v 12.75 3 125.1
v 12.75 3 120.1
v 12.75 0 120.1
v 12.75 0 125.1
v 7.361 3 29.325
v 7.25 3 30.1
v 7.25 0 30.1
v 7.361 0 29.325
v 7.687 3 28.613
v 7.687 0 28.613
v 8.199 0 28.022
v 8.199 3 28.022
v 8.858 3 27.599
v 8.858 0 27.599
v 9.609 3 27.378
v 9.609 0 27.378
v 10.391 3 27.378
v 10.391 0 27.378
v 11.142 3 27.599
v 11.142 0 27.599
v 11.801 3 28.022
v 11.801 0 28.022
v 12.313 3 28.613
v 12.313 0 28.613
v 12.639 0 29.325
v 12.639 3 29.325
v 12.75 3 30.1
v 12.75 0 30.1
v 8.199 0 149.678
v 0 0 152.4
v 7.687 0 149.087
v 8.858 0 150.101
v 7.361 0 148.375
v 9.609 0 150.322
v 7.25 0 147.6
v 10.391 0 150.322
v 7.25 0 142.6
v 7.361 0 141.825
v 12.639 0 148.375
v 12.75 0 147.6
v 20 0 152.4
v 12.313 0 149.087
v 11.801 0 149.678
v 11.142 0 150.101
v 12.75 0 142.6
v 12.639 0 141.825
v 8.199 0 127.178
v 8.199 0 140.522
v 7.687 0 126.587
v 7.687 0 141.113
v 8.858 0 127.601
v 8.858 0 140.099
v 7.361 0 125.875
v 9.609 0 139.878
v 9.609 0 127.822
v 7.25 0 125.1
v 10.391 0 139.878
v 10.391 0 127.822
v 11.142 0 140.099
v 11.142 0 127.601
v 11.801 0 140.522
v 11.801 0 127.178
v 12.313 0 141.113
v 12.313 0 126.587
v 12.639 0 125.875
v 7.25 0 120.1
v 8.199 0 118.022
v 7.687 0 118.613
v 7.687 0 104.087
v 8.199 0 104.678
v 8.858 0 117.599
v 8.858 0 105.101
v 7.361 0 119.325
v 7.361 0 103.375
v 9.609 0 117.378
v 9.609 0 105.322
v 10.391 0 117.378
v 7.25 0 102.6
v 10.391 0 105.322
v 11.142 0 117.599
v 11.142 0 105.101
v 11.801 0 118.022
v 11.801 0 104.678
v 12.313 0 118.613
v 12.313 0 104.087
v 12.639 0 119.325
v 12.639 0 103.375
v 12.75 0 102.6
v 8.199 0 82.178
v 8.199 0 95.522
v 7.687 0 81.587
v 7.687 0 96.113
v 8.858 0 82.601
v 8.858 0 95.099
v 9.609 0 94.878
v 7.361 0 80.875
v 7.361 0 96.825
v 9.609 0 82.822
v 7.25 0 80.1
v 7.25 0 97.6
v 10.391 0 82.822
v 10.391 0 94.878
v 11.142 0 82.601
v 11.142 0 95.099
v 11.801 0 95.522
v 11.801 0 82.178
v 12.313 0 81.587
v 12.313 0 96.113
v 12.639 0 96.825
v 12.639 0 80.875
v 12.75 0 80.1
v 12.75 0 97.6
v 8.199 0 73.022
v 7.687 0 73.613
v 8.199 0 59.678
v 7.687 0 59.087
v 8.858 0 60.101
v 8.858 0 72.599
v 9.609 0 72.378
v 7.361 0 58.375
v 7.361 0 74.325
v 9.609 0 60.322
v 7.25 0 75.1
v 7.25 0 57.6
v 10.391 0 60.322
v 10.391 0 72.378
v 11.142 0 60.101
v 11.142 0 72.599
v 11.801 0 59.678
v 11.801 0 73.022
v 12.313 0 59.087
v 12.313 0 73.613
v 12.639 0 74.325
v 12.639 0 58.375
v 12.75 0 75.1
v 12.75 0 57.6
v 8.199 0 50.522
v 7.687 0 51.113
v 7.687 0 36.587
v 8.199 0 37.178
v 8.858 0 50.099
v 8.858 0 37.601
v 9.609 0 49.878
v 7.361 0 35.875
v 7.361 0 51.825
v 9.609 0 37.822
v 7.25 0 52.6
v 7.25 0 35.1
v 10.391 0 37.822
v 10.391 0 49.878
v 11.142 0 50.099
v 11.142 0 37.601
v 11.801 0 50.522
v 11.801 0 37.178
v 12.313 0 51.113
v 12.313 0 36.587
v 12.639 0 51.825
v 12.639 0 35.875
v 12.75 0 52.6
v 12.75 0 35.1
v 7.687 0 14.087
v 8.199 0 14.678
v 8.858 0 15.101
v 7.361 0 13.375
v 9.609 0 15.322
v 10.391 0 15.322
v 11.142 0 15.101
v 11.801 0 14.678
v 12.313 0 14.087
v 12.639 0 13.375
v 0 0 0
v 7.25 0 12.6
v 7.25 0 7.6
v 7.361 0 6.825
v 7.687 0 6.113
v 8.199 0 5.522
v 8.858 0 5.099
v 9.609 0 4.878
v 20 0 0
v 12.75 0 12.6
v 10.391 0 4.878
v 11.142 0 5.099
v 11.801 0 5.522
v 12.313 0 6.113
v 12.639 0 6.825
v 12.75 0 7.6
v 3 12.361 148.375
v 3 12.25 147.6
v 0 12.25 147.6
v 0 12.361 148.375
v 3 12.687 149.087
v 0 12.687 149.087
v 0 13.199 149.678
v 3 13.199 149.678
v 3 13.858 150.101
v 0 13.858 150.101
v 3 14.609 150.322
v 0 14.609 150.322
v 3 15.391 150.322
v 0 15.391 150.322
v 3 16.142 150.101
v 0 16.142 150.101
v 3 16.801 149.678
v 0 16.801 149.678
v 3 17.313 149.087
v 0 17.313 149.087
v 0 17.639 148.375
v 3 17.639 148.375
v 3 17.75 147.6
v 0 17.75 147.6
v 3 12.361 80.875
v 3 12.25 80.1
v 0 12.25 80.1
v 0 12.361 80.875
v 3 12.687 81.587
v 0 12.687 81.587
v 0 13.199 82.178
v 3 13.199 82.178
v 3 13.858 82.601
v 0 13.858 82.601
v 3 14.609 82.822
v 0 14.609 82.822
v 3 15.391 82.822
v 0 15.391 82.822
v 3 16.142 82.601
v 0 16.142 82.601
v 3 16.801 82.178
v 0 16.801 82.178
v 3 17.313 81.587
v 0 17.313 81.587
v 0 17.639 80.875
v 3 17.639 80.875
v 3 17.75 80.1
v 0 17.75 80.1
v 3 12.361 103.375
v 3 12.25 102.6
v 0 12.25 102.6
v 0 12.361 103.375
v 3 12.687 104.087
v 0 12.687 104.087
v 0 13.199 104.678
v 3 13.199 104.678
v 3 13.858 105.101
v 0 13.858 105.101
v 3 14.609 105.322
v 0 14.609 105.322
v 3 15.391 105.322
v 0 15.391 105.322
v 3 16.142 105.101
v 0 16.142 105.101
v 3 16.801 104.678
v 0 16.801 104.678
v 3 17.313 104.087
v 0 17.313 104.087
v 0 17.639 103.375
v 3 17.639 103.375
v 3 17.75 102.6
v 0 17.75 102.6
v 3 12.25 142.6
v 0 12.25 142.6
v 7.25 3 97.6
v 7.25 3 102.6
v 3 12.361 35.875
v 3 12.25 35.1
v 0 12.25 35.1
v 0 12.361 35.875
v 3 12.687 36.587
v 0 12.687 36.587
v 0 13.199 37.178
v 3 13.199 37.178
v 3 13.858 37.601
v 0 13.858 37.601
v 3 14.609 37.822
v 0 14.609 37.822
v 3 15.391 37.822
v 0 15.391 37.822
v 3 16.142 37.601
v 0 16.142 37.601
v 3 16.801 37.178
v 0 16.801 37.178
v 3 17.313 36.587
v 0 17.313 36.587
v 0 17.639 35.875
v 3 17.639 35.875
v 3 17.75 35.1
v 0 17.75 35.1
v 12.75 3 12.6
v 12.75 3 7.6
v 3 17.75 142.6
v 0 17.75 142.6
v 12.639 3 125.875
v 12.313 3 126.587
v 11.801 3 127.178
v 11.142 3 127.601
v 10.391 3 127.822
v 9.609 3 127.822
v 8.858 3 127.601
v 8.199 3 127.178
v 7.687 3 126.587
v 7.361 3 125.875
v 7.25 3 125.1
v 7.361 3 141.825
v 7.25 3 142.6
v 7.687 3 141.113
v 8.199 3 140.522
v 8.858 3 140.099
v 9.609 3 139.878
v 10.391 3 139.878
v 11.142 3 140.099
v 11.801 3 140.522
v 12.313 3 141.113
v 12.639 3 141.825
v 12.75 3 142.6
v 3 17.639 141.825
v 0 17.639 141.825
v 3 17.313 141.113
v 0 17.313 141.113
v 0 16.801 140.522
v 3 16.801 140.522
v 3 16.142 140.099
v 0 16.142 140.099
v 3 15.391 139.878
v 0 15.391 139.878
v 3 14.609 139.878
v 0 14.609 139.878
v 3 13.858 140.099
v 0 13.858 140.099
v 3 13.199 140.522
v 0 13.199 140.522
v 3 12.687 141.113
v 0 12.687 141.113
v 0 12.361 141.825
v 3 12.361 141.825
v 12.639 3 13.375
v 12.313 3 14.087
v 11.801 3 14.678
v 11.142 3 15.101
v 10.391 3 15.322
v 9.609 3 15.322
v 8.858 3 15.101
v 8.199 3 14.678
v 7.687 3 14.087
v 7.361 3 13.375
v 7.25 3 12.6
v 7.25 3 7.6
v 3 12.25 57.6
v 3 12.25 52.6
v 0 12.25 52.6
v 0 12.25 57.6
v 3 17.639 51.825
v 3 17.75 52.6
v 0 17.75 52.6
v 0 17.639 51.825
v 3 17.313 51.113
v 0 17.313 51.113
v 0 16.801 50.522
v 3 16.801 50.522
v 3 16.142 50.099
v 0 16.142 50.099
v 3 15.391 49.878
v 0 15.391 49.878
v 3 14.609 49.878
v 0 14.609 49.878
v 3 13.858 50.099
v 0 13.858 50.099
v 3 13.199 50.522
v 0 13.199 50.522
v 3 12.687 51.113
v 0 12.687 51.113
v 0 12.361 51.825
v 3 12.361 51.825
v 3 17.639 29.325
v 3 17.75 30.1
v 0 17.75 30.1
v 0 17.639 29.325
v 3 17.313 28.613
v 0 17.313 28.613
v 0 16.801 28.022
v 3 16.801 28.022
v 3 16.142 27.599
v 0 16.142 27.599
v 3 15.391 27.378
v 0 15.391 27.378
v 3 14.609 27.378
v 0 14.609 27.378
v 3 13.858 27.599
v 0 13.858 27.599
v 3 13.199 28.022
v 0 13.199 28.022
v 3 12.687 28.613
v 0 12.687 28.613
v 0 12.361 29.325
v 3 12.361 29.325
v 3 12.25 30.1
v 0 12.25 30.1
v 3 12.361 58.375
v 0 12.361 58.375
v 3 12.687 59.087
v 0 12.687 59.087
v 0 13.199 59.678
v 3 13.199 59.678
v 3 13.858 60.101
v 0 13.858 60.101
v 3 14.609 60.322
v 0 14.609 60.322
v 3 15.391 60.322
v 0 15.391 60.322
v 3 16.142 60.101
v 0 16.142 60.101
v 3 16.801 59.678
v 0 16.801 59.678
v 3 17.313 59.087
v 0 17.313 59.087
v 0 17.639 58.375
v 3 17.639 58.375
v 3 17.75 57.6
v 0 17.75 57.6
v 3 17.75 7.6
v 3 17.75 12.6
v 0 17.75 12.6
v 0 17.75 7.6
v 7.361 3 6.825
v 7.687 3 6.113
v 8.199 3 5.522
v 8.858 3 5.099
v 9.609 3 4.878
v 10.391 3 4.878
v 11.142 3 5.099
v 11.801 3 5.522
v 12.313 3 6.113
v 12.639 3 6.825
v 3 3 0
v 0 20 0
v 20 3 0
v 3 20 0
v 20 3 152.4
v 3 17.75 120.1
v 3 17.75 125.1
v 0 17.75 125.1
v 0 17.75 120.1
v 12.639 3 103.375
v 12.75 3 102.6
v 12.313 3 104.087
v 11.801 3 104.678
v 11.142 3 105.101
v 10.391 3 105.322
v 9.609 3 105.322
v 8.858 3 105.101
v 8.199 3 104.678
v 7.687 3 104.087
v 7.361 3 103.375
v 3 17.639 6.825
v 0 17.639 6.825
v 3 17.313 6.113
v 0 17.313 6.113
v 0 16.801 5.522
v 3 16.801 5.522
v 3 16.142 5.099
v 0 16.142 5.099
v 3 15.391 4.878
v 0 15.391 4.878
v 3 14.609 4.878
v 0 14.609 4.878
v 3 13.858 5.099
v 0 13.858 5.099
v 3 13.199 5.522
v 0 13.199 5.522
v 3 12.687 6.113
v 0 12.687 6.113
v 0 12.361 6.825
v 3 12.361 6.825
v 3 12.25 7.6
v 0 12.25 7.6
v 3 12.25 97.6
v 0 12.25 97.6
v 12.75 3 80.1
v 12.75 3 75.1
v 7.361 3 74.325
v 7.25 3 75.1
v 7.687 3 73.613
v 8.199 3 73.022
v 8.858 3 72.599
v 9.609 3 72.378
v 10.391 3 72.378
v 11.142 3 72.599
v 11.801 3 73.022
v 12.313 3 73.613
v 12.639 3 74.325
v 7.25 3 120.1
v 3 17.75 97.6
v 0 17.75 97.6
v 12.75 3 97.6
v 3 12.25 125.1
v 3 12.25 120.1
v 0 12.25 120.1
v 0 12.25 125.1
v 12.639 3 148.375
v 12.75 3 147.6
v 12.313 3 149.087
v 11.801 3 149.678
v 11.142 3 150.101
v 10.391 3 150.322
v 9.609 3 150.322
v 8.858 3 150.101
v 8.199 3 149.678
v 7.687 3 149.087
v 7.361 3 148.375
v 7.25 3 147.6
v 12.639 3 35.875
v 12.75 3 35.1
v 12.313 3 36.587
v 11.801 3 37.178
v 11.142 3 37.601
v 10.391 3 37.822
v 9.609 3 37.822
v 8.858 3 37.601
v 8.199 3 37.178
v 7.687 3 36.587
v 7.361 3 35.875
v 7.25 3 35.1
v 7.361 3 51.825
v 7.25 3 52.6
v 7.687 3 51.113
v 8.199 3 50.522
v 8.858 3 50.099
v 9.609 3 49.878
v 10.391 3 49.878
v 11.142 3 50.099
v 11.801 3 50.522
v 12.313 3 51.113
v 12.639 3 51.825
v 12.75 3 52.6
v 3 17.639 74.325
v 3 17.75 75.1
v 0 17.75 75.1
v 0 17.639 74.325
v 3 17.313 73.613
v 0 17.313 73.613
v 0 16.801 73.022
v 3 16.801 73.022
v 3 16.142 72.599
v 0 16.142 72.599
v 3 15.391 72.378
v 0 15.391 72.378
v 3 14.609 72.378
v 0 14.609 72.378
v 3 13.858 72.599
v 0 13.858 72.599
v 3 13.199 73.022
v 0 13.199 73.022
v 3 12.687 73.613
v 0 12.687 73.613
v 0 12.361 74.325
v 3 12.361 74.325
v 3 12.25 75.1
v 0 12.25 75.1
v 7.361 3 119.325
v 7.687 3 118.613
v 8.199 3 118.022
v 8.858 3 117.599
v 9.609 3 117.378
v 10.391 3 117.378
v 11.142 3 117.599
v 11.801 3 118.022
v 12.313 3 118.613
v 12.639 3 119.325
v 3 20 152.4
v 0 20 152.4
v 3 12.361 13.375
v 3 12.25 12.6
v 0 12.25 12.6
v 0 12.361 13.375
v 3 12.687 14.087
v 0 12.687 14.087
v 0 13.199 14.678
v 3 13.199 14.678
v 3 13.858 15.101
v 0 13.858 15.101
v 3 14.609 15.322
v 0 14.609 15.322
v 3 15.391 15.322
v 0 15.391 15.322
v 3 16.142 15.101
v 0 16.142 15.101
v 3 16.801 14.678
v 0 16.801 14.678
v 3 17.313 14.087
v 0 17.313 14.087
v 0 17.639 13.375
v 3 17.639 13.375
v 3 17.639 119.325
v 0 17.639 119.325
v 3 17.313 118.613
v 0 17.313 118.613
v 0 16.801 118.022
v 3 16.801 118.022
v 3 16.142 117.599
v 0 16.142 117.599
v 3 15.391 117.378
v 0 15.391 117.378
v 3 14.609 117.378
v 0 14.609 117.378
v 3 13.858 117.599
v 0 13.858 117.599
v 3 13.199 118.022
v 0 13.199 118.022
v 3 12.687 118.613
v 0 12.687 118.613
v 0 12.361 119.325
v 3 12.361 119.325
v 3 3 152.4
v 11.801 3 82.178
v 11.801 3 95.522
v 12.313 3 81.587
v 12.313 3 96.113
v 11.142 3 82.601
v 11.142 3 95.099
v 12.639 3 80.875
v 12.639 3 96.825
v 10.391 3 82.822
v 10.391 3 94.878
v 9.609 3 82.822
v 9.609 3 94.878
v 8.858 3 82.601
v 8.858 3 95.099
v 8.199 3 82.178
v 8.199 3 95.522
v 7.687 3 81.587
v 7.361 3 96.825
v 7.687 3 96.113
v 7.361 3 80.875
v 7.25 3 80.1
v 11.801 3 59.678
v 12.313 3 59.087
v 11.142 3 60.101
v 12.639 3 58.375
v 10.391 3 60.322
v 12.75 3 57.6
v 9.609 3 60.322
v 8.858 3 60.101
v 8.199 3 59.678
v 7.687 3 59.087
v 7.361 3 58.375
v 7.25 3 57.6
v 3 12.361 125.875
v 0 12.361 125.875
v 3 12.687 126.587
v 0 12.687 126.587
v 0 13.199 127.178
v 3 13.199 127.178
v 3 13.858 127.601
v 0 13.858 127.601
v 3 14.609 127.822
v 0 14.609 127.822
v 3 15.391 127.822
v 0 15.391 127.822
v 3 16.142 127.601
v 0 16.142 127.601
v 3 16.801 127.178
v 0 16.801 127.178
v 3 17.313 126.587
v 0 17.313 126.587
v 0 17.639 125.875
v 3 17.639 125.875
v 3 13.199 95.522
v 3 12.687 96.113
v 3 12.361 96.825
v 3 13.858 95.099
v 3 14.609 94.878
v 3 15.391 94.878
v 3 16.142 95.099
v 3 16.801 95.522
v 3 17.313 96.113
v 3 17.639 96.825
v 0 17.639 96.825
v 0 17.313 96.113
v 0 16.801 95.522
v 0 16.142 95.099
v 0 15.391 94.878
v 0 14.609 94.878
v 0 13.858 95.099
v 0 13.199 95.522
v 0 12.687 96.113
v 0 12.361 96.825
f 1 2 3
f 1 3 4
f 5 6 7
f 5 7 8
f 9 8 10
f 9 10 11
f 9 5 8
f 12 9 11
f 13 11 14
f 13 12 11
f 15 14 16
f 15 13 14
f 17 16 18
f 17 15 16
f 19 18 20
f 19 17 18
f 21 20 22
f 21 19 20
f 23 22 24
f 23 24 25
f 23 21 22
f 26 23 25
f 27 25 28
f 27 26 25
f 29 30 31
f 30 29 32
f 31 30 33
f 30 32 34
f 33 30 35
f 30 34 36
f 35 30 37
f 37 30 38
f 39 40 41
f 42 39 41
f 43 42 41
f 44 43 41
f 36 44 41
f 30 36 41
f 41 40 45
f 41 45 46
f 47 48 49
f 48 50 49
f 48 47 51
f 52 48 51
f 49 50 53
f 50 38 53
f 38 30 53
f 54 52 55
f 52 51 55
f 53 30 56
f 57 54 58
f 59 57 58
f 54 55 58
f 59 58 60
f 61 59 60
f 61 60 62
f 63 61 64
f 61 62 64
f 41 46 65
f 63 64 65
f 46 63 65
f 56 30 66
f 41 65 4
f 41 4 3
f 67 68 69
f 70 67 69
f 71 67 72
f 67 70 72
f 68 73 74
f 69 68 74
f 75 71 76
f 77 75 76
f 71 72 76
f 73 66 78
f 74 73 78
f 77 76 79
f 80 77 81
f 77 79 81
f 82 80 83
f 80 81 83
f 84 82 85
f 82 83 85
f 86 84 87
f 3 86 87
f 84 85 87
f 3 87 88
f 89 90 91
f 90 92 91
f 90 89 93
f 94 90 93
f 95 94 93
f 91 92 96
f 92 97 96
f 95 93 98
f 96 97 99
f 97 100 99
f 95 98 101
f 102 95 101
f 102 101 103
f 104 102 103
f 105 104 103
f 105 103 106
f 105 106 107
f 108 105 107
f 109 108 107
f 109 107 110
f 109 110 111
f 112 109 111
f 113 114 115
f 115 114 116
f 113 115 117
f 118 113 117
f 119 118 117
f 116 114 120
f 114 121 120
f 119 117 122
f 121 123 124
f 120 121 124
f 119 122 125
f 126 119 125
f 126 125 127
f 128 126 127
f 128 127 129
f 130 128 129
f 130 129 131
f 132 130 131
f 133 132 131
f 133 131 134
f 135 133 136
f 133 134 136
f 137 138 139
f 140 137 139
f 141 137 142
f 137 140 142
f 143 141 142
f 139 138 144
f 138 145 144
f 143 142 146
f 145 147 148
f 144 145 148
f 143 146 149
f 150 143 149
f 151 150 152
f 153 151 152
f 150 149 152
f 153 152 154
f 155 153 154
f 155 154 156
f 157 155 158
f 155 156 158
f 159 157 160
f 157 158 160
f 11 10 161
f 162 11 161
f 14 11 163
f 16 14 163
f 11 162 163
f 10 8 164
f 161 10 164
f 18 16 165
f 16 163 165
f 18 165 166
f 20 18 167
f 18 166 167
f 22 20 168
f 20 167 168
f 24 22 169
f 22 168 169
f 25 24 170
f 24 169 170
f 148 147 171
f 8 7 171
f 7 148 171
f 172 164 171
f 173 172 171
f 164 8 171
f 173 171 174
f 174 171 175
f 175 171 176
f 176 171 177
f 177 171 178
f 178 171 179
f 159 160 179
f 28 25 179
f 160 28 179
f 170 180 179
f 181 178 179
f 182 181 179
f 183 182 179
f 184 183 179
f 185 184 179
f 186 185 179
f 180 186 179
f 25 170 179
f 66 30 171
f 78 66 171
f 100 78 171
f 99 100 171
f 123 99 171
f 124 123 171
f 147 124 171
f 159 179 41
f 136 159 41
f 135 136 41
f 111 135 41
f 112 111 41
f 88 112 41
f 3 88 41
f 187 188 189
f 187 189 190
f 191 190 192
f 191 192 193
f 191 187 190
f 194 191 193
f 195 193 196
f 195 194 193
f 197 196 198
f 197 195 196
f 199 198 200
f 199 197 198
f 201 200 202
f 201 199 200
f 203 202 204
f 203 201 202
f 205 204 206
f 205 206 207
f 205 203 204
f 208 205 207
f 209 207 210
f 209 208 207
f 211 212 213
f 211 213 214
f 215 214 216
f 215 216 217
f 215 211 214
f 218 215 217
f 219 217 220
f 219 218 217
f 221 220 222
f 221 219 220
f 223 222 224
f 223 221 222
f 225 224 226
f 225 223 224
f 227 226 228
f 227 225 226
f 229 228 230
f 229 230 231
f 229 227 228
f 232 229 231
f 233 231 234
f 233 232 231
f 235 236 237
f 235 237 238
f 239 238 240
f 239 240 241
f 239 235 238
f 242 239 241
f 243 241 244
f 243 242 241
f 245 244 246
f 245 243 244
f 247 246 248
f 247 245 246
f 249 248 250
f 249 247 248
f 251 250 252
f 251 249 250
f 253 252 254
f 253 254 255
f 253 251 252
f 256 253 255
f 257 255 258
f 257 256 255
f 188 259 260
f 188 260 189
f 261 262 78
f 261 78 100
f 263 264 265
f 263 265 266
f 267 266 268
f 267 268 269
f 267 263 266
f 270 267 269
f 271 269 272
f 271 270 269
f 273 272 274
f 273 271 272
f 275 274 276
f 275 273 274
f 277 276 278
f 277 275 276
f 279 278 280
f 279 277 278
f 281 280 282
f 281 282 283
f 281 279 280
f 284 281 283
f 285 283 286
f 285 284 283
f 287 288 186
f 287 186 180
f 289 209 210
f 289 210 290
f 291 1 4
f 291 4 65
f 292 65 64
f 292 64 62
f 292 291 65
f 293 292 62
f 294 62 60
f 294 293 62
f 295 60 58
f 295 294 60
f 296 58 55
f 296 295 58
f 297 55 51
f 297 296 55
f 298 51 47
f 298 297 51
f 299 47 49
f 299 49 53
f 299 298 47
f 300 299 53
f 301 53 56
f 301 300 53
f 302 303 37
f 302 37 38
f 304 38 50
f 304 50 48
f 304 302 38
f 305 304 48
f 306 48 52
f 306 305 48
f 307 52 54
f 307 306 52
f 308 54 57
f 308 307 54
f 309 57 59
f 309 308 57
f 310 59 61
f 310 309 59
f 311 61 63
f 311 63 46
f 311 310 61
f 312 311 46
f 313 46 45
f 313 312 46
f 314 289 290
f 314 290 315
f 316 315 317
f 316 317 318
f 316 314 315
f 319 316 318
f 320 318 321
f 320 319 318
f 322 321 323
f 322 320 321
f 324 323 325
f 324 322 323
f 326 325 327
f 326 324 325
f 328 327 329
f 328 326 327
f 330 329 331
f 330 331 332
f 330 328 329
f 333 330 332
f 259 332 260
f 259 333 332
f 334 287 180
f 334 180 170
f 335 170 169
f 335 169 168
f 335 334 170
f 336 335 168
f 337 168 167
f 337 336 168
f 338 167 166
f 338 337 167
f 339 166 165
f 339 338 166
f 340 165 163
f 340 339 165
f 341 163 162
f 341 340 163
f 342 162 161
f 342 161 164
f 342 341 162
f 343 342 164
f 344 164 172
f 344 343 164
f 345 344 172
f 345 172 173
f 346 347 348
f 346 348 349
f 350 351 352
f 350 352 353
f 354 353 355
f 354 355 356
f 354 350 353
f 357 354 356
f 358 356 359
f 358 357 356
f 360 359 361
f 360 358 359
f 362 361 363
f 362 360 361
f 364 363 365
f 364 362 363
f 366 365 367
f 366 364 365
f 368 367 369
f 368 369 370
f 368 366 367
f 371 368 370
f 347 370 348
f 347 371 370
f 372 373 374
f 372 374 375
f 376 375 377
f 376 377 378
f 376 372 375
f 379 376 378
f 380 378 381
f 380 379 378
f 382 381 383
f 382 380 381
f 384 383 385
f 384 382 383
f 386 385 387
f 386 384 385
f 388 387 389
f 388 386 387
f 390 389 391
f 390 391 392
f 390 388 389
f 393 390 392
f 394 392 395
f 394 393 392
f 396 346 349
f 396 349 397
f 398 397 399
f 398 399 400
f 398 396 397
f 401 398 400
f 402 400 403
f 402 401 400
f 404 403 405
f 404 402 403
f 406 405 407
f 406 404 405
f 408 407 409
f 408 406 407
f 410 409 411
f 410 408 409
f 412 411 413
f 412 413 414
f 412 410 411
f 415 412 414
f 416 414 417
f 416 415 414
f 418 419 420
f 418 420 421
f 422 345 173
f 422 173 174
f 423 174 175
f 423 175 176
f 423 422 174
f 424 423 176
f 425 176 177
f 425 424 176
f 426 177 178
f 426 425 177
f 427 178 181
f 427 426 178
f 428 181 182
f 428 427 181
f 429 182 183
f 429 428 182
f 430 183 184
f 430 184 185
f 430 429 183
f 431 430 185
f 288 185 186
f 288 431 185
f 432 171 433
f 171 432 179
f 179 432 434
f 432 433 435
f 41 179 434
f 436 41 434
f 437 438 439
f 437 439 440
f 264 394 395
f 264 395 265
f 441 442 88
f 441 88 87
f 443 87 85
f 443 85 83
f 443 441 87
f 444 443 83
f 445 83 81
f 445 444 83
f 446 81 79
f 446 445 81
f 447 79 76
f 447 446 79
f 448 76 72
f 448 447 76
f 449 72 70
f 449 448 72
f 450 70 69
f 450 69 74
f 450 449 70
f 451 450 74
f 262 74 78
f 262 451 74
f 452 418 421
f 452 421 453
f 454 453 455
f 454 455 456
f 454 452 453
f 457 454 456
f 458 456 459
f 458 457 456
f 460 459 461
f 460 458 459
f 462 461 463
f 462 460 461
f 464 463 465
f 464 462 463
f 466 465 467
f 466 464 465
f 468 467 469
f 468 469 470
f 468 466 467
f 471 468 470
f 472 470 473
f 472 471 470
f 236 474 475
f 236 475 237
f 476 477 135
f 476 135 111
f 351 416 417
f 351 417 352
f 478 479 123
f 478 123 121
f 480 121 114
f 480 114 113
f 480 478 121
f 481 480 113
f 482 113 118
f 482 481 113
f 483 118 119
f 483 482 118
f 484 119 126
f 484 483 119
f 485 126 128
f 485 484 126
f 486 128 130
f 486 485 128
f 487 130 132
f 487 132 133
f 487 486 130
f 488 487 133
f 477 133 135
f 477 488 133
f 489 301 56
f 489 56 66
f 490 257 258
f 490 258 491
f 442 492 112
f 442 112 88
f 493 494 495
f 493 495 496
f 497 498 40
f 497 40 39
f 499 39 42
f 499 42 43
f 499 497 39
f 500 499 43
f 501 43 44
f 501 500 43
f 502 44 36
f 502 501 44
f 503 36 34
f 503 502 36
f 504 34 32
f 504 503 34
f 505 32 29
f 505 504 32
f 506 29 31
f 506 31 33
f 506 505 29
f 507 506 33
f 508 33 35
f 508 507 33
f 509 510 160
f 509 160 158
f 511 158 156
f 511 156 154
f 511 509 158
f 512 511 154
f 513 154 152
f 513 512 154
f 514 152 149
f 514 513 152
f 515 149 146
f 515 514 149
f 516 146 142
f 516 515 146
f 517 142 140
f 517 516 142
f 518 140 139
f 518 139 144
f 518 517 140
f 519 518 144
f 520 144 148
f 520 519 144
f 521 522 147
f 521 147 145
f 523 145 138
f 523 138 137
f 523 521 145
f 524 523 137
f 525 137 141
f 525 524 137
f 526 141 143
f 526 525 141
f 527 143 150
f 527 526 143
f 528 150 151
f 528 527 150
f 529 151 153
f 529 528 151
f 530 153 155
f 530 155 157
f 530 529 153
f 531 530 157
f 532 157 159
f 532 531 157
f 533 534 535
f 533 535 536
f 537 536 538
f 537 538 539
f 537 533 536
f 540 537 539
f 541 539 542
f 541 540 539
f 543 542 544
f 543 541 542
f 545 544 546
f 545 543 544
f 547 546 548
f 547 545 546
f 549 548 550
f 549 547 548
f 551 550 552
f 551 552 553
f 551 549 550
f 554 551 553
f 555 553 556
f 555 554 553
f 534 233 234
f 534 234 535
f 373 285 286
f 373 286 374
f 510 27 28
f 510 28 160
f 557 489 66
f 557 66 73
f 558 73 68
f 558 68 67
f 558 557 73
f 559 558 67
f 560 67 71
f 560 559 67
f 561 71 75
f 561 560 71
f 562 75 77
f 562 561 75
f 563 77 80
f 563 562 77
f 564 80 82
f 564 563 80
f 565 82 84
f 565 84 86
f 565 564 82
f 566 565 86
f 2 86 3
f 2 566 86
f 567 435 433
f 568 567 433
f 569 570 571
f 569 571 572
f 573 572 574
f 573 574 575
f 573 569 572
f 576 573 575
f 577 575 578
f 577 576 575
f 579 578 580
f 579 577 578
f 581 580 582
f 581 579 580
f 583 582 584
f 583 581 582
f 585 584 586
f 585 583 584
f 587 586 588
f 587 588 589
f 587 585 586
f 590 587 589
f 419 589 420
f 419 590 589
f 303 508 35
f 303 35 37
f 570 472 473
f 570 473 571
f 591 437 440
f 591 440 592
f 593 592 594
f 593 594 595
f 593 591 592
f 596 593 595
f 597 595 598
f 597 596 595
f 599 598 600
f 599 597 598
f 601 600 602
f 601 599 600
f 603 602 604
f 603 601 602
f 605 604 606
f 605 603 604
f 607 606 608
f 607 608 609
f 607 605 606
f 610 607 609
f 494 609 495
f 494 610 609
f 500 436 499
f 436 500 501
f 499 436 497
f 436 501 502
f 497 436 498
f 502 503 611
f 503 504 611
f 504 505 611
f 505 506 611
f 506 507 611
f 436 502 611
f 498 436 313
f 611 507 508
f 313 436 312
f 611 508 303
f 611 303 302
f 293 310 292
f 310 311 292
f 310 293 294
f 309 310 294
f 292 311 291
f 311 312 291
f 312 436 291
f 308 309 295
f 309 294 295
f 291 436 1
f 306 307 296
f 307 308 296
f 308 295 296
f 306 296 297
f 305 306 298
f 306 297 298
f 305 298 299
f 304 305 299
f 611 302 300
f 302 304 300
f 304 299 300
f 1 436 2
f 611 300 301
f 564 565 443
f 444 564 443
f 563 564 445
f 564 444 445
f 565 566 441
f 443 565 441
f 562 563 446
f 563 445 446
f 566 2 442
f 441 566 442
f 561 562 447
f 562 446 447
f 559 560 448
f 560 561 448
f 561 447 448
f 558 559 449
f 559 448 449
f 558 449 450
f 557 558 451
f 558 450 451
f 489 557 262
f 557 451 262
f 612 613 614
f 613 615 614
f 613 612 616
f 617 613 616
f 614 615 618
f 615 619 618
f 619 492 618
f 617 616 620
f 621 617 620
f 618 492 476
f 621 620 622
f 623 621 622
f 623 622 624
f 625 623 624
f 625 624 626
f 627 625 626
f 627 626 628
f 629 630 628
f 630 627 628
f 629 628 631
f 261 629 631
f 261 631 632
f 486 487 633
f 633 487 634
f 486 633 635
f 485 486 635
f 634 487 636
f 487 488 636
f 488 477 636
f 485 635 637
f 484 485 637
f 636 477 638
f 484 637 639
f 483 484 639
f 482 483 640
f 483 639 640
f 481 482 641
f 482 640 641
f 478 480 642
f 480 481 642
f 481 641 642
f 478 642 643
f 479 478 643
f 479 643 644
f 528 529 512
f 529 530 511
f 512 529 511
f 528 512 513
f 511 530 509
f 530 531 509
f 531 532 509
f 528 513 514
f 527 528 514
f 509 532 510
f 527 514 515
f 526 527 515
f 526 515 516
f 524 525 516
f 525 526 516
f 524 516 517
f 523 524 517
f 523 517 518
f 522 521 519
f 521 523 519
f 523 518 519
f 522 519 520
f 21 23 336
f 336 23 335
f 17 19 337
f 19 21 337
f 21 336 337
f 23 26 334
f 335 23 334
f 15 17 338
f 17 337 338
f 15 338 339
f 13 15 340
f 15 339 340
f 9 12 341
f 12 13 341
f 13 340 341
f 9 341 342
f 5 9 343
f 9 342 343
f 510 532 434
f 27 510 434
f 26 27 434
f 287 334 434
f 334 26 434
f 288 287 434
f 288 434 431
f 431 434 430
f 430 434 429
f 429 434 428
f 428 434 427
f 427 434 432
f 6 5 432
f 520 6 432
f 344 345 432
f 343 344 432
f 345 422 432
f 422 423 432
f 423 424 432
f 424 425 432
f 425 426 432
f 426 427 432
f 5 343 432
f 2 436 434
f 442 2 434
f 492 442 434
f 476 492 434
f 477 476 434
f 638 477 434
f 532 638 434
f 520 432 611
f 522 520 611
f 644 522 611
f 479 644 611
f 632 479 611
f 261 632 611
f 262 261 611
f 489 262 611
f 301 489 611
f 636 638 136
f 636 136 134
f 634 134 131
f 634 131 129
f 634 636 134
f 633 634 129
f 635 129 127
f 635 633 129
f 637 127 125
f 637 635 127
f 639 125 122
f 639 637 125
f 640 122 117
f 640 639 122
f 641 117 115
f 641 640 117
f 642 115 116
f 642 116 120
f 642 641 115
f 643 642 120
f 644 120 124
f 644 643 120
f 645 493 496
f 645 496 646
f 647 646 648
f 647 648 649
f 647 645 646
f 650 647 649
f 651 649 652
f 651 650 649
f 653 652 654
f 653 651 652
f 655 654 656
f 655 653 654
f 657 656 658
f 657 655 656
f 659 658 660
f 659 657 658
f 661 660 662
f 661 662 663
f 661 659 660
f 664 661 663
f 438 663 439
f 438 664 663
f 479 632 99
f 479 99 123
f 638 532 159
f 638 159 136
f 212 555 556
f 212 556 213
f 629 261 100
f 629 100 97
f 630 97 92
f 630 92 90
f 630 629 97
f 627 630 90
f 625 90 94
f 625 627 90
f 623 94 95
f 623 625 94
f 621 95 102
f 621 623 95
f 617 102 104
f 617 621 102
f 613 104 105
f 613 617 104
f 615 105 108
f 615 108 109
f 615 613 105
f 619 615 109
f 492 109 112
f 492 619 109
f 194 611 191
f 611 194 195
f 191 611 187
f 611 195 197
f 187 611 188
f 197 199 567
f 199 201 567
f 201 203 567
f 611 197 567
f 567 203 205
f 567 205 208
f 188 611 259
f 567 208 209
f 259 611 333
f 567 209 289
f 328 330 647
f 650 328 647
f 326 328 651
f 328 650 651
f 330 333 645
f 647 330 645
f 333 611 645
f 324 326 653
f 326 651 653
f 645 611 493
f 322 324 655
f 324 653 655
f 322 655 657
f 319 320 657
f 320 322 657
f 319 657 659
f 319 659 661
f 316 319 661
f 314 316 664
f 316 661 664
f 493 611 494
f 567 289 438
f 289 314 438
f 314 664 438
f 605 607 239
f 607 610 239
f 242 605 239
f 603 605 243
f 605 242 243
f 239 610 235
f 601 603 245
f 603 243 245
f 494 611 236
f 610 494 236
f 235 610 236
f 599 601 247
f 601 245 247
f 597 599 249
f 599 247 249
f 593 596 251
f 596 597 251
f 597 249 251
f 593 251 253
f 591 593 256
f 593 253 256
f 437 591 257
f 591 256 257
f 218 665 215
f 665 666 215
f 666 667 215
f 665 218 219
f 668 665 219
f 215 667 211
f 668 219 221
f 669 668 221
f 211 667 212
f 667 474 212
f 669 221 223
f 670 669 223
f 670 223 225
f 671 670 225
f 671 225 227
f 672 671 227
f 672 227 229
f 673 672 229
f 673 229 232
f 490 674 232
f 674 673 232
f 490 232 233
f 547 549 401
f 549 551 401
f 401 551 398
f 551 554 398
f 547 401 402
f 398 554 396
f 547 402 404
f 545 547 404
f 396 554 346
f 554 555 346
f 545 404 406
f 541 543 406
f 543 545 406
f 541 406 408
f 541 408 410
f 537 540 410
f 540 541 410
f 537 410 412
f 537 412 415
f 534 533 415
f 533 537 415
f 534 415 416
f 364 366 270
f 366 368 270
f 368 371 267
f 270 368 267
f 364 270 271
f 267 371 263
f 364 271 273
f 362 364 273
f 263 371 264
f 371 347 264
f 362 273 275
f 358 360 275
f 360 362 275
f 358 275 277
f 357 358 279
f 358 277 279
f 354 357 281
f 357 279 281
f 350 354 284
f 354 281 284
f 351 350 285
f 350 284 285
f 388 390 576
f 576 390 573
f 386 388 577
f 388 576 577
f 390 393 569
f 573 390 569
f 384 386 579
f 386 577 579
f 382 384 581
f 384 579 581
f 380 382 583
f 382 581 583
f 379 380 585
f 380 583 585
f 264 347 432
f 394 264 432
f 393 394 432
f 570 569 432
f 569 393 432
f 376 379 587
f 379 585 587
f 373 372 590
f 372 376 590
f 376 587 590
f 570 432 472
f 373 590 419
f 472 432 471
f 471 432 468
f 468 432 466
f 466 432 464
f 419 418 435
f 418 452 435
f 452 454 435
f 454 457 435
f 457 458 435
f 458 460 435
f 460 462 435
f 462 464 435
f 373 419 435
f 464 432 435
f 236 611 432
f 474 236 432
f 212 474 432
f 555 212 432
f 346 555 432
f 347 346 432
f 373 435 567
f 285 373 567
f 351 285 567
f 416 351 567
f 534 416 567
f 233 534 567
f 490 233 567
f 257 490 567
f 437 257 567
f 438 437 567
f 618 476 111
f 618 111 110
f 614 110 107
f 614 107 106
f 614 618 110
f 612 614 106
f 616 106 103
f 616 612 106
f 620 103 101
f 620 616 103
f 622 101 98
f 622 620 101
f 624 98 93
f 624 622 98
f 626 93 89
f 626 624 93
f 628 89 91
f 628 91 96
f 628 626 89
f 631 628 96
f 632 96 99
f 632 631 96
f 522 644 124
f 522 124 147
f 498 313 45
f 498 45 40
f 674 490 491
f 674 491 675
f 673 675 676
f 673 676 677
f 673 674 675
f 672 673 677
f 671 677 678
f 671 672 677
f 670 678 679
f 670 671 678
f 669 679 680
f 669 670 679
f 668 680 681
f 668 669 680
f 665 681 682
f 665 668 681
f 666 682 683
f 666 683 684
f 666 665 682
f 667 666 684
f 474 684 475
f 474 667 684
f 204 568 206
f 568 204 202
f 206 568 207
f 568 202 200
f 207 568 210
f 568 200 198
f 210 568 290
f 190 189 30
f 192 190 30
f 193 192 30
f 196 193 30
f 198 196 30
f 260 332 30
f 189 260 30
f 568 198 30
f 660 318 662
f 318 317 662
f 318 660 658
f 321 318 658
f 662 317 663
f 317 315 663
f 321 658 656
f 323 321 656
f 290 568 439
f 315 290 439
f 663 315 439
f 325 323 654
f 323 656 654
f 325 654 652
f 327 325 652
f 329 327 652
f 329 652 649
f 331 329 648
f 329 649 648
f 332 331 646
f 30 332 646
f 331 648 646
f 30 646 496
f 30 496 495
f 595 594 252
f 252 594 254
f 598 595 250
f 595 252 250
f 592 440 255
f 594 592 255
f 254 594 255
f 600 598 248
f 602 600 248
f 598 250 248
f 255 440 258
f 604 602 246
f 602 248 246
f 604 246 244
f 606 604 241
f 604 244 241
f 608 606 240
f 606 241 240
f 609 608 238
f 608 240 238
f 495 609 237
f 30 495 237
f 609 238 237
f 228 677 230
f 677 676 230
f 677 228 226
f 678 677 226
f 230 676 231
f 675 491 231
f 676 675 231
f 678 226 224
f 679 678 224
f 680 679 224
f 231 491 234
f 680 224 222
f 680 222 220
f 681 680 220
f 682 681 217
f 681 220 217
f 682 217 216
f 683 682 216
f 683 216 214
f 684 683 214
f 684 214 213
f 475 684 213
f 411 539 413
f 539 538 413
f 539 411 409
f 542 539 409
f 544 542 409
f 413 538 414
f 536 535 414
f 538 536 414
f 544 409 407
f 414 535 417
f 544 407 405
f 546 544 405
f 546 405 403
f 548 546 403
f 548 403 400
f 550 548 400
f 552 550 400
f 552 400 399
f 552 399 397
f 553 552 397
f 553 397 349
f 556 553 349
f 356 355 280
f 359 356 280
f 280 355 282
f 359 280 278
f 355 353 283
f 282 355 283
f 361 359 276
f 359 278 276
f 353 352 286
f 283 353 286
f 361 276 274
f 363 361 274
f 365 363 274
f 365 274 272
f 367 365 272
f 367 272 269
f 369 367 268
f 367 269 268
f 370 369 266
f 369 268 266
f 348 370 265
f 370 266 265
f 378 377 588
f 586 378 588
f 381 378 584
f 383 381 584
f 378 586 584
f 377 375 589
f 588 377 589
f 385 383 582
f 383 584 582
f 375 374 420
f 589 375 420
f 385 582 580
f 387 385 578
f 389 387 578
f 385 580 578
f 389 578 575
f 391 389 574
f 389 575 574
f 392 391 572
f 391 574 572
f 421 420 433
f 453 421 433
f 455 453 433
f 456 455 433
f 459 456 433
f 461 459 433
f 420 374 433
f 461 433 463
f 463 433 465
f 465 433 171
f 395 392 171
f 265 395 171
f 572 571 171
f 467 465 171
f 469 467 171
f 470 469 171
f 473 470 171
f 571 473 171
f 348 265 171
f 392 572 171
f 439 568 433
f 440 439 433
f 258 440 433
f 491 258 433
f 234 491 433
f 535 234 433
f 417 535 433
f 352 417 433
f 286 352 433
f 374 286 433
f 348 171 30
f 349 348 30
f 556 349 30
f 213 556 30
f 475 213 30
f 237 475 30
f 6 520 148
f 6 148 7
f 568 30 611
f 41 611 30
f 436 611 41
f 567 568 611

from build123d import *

# Parameters (mm, degrees)
EXTRUDE_THIN1_DEPTH = 152.4
CUT_EXTRUDE1_DEPTH  = 3
CUT_EXTRUDE2_DEPTH  = 3
LPATTERN1_COUNT     = 4
LPATTERN1_PITCH     = 45
LPATTERN2_COUNT     = 4
LPATTERN2_PITCH     = 45


with BuildPart() as part:
    # Sketch1 → Extrude-Thin1 (new body)
    with BuildSketch(Plane.XY):
        Polygon((0, 20), (0, 0), (20, 0), (20, 3), (3, 3), (3, 20), align=None)
    extrude(amount=EXTRUDE_THIN1_DEPTH)

    # Sketch2 → Cut-Extrude1 (cut)
    with BuildSketch(Plane(origin=(0, 3, 0), x_dir=(1, 0, 0), z_dir=(0, 1, 0))):
        with BuildLine():
            Line((7.25, -147.6), (7.25, -142.6))
            ThreePointArc((7.25, -142.6), (10, -139.85), (12.75, -142.6))
            Line((12.75, -142.6), (12.75, -147.6))
            ThreePointArc((12.75, -147.6), (10, -150.35), (7.25, -147.6))
        make_face()
        with BuildLine():
            Line((12.75, -120.1), (12.75, -125.1))
            ThreePointArc((12.75, -125.1), (10, -127.85), (7.25, -125.1))
            Line((7.25, -125.1), (7.25, -120.1))
            ThreePointArc((7.25, -120.1), (10, -117.35), (12.75, -120.1))
        make_face()
        with BuildLine():
            Line((7.25, -102.6), (7.25, -97.6))
            ThreePointArc((7.25, -97.6), (10, -94.85), (12.75, -97.6))
            Line((12.75, -97.6), (12.75, -102.6))
            ThreePointArc((12.75, -102.6), (10, -105.35), (7.25, -102.6))
        make_face()
    cut_extrude1 = extrude(amount=-CUT_EXTRUDE1_DEPTH, mode=Mode.SUBTRACT)

    # Sketch3 → Cut-Extrude2 (cut)
    with BuildSketch(Plane(origin=(3, 0, 0), x_dir=(0, 0, -1), z_dir=(1, 0, 0))):
        with BuildLine():
            Line((-147.6, 17.75), (-142.6, 17.75))
            ThreePointArc((-142.6, 17.75), (-139.85, 15), (-142.6, 12.25))
            Line((-142.6, 12.25), (-147.6, 12.25))
            ThreePointArc((-147.6, 12.25), (-150.35, 15), (-147.6, 17.75))
        make_face()
        with BuildLine():
            Line((-125.1, 17.75), (-120.1, 17.75))
            ThreePointArc((-120.1, 17.75), (-117.35, 15), (-120.1, 12.25))
            Line((-120.1, 12.25), (-125.1, 12.25))
            ThreePointArc((-125.1, 12.25), (-127.85, 15), (-125.1, 17.75))
        make_face()
        with BuildLine():
            Line((-102.6, 17.75), (-97.6, 17.75))
            ThreePointArc((-97.6, 17.75), (-94.85, 15), (-97.6, 12.25))
            Line((-97.6, 12.25), (-102.6, 12.25))
            ThreePointArc((-102.6, 12.25), (-105.35, 15), (-102.6, 17.75))
        make_face()
    cut_extrude2 = extrude(amount=-CUT_EXTRUDE2_DEPTH, mode=Mode.SUBTRACT)

    # LPattern1: Cut-Extrude1 ×4
    with Locations(*[(0, 0, -i * LPATTERN1_PITCH) for i in range(1, LPATTERN1_COUNT)]):
        add(cut_extrude1, mode=Mode.SUBTRACT)

    # LPattern2: Cut-Extrude2 ×4
    with Locations(*[(0, 0, -i * LPATTERN2_PITCH) for i in range(1, LPATTERN2_COUNT)]):
        add(cut_extrude2, mode=Mode.SUBTRACT)


solid = part.part
